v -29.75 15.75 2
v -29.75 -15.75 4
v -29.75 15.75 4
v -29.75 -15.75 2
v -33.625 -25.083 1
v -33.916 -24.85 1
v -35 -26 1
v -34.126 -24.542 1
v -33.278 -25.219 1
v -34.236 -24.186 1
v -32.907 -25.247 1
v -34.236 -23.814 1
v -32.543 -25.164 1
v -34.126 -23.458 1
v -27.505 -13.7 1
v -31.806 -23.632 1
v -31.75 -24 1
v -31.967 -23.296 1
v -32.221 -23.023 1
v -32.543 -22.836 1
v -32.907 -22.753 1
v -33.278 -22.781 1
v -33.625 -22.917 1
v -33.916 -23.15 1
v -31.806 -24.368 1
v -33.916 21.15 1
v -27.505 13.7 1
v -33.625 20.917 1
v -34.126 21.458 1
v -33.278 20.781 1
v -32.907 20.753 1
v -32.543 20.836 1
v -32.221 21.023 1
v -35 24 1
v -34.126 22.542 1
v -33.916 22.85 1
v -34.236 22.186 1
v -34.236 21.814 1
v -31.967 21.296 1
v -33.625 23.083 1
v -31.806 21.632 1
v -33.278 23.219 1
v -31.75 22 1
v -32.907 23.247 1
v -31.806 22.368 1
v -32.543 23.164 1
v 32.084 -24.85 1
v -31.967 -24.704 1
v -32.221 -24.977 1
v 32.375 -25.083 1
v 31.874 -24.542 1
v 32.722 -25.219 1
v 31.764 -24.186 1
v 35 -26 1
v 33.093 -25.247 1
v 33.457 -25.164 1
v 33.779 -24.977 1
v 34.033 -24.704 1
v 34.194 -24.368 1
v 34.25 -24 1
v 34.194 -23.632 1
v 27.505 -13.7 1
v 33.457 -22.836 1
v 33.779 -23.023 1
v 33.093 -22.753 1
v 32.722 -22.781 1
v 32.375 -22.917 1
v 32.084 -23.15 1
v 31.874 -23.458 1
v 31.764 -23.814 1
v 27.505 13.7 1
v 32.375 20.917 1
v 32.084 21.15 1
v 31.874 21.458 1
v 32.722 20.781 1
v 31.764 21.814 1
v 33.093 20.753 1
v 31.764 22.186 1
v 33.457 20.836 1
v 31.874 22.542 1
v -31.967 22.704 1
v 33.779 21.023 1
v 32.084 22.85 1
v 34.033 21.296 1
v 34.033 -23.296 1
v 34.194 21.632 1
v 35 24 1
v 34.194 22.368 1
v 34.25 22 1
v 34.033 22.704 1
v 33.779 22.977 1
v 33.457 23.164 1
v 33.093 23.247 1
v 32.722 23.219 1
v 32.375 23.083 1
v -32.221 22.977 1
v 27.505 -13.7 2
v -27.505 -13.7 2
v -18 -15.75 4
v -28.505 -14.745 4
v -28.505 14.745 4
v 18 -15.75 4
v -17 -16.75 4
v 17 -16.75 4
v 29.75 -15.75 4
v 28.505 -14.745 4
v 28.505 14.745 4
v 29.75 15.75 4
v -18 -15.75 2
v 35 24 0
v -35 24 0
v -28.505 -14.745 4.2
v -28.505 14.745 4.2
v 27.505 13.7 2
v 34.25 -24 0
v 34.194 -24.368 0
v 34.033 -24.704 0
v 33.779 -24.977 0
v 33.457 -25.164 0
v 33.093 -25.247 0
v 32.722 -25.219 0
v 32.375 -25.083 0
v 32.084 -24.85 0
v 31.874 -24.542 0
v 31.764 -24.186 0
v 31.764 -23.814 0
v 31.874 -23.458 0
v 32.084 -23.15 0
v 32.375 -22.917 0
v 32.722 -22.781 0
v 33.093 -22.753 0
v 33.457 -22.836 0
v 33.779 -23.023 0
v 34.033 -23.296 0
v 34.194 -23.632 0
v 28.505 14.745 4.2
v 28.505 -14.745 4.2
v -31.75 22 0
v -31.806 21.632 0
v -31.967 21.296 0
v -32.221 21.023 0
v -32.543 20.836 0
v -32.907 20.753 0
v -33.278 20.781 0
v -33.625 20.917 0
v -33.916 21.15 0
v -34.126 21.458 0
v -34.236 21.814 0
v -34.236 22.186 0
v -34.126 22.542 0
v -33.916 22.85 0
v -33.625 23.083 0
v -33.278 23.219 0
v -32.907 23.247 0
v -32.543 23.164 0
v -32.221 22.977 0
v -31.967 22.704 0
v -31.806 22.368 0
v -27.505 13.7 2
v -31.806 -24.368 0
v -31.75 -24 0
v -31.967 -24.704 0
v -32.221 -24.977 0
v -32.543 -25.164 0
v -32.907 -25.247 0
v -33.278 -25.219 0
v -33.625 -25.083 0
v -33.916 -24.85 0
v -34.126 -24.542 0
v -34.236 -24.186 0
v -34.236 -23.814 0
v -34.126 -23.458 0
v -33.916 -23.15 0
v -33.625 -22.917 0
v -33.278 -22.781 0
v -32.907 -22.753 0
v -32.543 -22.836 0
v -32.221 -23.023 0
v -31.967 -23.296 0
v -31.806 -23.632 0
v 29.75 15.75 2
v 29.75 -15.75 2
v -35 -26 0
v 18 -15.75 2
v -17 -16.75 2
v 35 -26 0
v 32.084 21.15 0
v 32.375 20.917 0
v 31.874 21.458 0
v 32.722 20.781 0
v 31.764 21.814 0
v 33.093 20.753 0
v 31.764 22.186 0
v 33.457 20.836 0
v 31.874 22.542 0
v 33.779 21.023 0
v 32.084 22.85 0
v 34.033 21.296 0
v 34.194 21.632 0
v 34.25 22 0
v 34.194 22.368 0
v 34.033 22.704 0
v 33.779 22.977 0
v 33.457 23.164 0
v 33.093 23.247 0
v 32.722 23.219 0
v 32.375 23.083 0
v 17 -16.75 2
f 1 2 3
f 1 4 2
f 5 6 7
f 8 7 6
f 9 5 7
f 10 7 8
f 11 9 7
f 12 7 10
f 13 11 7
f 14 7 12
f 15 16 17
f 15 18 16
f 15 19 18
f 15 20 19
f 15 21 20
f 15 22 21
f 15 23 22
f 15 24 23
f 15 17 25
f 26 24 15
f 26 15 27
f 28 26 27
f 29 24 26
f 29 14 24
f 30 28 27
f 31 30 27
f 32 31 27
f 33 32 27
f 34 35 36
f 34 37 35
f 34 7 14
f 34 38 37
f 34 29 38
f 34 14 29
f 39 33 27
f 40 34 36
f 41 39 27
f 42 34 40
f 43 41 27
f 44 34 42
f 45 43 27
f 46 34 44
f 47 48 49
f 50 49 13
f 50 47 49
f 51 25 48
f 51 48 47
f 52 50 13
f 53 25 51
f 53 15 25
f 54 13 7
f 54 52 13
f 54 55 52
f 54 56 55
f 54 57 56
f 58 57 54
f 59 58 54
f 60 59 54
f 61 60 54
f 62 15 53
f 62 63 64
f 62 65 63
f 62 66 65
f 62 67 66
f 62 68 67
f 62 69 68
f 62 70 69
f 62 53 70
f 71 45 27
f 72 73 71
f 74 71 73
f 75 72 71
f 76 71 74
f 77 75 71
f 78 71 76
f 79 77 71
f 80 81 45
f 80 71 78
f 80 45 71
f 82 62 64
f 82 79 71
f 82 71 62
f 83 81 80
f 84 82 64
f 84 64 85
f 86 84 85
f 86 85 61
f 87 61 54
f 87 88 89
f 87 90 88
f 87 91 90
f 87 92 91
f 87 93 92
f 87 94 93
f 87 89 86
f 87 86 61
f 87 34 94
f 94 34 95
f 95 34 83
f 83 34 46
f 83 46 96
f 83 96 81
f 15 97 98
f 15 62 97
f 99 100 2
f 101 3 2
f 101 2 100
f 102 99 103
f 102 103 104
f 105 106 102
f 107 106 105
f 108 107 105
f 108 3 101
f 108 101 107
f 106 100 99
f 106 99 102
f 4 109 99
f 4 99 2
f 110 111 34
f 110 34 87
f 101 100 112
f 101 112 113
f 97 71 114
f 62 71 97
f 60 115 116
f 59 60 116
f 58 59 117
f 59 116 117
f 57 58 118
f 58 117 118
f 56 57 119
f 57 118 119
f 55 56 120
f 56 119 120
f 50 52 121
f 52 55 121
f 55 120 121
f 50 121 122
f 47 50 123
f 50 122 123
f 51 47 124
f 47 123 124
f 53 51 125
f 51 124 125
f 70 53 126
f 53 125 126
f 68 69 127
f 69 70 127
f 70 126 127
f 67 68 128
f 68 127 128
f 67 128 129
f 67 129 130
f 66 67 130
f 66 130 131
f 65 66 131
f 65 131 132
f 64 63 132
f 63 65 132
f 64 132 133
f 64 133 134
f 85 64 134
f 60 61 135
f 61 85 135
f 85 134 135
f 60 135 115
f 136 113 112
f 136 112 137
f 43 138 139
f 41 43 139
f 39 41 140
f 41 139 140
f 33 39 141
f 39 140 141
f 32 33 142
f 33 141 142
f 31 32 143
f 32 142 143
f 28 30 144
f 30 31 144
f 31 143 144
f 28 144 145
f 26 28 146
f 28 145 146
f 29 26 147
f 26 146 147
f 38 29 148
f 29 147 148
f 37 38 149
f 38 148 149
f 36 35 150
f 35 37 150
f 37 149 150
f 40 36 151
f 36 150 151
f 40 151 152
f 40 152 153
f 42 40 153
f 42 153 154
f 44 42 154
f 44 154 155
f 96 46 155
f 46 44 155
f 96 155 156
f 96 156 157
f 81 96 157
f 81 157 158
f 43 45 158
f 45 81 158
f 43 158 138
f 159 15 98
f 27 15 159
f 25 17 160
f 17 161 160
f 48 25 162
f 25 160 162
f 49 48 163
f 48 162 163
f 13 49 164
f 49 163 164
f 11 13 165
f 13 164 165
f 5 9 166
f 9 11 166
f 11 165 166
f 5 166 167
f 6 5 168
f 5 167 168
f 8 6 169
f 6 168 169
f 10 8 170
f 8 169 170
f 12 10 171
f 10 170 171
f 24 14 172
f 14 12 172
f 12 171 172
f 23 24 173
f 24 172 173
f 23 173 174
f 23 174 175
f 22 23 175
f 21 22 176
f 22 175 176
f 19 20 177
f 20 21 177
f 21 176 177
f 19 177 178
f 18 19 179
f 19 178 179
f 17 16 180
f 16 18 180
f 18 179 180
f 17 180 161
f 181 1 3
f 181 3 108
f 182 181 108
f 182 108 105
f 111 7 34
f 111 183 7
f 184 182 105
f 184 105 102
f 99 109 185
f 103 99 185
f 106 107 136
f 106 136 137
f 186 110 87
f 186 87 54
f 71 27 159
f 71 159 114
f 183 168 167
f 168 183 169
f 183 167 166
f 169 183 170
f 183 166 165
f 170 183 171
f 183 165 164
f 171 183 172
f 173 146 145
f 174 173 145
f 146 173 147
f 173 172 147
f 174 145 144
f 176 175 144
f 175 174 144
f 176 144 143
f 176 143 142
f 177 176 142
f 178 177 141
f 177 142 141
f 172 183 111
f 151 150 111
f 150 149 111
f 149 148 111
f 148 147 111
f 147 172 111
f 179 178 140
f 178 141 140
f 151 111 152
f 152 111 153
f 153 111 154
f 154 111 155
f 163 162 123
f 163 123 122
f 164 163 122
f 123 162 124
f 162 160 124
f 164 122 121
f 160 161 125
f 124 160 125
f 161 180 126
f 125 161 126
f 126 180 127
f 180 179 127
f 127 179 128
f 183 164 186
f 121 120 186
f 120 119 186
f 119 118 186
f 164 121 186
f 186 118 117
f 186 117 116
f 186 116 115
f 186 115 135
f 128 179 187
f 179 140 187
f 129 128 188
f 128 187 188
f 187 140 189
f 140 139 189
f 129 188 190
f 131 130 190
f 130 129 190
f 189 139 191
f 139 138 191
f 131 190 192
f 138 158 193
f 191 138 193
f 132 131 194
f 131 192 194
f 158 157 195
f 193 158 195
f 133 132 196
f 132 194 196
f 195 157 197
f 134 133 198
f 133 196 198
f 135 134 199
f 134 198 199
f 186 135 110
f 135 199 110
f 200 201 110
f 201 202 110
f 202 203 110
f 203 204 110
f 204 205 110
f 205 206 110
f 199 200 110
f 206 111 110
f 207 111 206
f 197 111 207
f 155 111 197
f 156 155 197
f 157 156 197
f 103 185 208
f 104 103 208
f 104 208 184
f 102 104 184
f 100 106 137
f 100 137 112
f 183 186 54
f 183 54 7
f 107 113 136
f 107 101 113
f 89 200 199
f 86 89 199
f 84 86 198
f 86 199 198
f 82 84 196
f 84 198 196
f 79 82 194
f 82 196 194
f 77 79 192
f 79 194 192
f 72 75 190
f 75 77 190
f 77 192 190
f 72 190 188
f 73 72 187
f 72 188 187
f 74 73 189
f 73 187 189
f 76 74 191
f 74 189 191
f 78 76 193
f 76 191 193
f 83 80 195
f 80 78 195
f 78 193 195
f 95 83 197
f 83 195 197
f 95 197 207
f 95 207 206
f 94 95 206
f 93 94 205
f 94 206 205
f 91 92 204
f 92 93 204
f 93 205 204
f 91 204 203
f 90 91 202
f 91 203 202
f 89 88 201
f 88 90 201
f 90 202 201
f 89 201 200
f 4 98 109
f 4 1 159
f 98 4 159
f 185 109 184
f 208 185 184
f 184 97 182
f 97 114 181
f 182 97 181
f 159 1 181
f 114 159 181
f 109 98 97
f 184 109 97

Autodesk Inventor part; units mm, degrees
ref_plane "YZ Plane" through (0, 0, 0) normal (1, 0, 0) x (0, 1, 0)
ref_plane "XZ Plane" through (0, 0, 0) normal (0, 1, 0) x (-1, 0, 0)
ref_plane "XY Plane" through (0, 0, 0) normal (0, 0, 1) x (1, 0, 0)
sketch "Sketch1" plane through (0, 0, 0) normal (0, 0, 1) x (1, 0, 0)
  line L0 (-27.505, 13.7) -> (27.505, 13.7)
  line L1 (27.505, 13.7) -> (27.505, -13.7)
  line L2 (27.505, -13.7) -> (-27.505, -13.7)
  line L3 (-27.505, -13.7) -> (-27.505, 13.7)
  line L4 (-49, 0) -> (49, 0) construction
  line L5 (0, -36) -> (0, 34) construction
  line L6 (-28.505, 14.745) -> (28.505, 14.745)
  line L7 (28.505, 14.745) -> (28.505, -14.745)
  line L8 (28.505, -14.745) -> (-28.505, -14.745)
  line L9 (-28.505, -14.745) -> (-28.505, 14.745)
  line L10 (-29.75, 15.75) -> (29.75, 15.75)
  line L11 (29.75, 15.75) -> (29.75, -15.75)
  line L12 (-29.75, -15.75) -> (-29.75, 15.75)
  line L13 (-31, 17) -> (31, 17)
  line L14 (31, 17) -> (31, -22)
  line L15 (31, -22) -> (-31, -22)
  line L16 (-31, -22) -> (-31, 17)
  line L17 (-31, 17) -> (-29.75, 15.75) construction
  line L18 (-18, -15.75) -> (-17, -16.75)
  line L19 (-17, -16.75) -> (17, -16.75)
  line L20 (17, -16.75) -> (18, -15.75)
  line L21 (29.75, -15.75) -> (18, -15.75)
  line L22 (-18, -15.75) -> (-29.75, -15.75)
  line L23 (-35, 24) -> (35, 24)
  line L24 (35, 24) -> (35, -26)
  line L25 (35, -26) -> (-35, -26)
  line L26 (-35, -26) -> (-35, 24)
  line L27 (-35, -26) -> (-31, -22) construction
  circle A0 centre (-33, -24) radius 1.25
  circle A1 centre (-33, 22) radius 1.25
  circle A2 centre (33, -24) radius 1.25
  circle A3 centre (33, 22) radius 1.25
  point P0 (0, 0)
  dimension "d0" = 55.01
  dimension "d1" = 27.4
  dimension "d2" = 57.01
  dimension "d3" = 29.49
  dimension "d4" = 59.5
  dimension "d5" = 31.5
  dimension "d6" = 62
  dimension "d7" = 39
  dimension "d8" = 34
  dimension "d10" = 1
  dimension "d11" = 70
  dimension "d12" = 50
  dimension "d21" = 2
  dimension "d22" = 2.5
  dimension "d33" = 46
  dimension "d36" = 66
extrude "Extrusion1" add sketch "Sketch1" along normal blind 1 contours L0 L1 L2 L3 | L6 L7 L8 L9 | L10 L11 L21 L20 L19 L18 L22 L12 | L13 L14 L15 L16 | L23 L24 L25 L26
extrude "Extrusion2" add sketch "Sketch1" along normal blind 2 contours L0 L1 L2 L3
extrude "Extrusion3" add sketch "Sketch1" along normal blind 2 from surface at 2 contours L0 L1 L2 L3 | L6 L7 L8 L9 | L10 L11 L21 L20 L19 L18 L22 L12
extrude "Extrusion4" add sketch "Sketch1" along normal blind 0.2 from surface at 4 contours L0 L1 L2 L3 | L6 L7 L8 L9
equation "\"d33\" = d12 - 2 * d21"
equation "\"d36\" = d11 - 2 * d21"
properties part number "Adafruit 2.4 OLED display"
